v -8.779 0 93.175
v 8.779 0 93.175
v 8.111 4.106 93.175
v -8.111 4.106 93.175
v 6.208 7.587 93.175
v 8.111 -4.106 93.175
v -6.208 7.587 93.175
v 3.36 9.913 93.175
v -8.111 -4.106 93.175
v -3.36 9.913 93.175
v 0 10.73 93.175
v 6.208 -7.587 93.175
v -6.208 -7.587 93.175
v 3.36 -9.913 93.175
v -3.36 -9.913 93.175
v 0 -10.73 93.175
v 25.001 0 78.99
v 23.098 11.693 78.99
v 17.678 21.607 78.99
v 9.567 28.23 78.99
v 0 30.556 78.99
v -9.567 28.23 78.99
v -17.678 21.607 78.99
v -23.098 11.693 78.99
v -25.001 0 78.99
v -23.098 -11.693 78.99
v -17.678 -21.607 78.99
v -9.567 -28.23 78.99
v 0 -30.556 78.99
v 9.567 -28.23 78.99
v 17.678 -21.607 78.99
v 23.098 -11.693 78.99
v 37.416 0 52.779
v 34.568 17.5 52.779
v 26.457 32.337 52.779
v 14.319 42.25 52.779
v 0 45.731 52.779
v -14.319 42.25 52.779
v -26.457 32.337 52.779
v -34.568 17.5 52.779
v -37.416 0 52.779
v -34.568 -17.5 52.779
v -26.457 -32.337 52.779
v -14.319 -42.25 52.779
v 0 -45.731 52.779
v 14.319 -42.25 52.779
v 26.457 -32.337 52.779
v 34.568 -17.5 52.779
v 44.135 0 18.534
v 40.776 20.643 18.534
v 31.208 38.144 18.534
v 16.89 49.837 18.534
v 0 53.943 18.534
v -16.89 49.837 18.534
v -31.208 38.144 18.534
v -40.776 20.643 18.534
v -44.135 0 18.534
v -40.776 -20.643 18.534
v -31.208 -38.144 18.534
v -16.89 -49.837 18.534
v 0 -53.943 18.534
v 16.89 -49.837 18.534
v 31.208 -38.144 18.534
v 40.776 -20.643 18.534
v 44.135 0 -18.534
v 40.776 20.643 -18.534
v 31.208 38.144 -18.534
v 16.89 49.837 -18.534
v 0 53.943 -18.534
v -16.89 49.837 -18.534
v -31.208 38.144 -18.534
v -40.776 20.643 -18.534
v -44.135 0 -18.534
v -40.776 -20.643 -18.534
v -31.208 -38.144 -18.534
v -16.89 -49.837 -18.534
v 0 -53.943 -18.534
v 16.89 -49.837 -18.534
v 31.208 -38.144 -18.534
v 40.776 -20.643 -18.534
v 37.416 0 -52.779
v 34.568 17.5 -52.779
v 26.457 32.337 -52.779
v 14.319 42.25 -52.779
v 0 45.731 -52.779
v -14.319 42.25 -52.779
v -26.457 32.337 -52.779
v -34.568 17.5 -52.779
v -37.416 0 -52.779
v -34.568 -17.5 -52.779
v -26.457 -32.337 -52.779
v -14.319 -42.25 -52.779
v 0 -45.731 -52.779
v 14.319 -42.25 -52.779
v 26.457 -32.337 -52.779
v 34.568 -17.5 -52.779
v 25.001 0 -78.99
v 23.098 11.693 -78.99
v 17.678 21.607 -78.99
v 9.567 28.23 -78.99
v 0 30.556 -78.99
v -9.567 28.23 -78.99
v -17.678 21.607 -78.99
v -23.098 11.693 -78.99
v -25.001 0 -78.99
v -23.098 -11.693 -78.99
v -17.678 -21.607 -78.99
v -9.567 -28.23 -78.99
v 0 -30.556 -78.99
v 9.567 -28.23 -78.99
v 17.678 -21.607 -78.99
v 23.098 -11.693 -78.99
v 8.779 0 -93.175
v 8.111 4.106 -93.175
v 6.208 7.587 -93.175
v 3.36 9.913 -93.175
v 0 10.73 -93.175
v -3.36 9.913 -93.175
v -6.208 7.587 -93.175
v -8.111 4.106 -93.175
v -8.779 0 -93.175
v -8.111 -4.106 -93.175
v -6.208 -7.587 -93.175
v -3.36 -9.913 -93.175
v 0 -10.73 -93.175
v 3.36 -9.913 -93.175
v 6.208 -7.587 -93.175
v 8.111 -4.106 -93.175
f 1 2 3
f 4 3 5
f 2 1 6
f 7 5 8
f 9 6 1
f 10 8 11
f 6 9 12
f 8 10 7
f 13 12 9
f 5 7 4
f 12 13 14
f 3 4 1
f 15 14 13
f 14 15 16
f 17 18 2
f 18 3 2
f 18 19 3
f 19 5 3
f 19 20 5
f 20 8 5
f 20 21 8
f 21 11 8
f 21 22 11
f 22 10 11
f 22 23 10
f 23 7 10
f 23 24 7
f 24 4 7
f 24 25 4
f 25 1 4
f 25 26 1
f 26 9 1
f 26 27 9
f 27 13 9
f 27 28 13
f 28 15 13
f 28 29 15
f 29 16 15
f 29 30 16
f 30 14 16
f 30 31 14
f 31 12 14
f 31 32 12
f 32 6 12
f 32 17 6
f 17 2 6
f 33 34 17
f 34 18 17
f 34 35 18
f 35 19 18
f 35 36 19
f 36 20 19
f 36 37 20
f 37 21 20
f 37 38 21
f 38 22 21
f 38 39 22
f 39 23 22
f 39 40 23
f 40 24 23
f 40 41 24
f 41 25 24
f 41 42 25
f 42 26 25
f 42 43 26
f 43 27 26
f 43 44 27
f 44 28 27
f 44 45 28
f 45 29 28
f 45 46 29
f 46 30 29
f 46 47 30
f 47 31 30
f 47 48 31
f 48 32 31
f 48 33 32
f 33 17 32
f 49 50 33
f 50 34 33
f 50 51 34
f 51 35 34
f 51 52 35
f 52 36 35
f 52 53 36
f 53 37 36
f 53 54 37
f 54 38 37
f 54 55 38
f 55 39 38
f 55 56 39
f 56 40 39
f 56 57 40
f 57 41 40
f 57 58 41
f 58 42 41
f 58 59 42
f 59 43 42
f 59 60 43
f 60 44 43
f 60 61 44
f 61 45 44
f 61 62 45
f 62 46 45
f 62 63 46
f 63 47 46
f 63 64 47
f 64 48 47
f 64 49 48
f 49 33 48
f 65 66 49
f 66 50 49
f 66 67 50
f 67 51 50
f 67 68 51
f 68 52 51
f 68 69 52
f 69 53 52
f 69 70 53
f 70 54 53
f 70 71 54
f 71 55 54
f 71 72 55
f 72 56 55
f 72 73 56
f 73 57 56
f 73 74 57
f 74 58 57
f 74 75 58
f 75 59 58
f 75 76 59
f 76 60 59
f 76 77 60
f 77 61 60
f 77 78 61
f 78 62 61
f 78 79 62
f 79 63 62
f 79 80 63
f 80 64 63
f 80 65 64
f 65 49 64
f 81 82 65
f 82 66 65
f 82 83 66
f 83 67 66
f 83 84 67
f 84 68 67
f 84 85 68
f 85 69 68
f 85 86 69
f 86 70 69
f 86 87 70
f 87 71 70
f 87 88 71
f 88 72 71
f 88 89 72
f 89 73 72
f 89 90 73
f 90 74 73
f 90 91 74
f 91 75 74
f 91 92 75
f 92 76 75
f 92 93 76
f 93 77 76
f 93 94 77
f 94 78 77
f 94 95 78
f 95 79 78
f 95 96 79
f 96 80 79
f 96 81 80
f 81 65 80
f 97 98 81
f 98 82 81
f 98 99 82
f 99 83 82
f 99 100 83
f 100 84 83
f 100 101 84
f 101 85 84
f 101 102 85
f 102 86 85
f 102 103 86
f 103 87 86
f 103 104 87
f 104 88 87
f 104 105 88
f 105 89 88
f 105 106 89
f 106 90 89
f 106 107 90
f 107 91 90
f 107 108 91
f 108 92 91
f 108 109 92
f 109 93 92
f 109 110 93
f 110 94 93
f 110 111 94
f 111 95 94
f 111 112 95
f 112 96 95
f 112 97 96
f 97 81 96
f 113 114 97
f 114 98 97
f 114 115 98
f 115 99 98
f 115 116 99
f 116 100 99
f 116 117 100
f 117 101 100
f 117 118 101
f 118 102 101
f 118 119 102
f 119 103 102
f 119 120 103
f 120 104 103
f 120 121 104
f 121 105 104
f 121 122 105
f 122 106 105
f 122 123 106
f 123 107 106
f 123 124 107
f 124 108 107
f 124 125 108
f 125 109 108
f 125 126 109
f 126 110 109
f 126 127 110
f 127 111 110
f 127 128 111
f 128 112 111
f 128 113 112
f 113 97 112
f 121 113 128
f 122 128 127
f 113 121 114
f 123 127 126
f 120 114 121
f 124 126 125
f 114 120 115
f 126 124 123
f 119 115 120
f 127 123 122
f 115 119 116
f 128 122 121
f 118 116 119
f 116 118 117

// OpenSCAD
// Generated by SolidPython 1.0.1 on 2020-07-29 00:46:48


scale(v = [9, 11, 19]) {
	sphere(r = 5);
}
/***********************************************
*********      SolidPython code:      **********
************************************************
 
# import packages: SolidPython
from solid import *
from solid.utils import *
from itertools import chain, combinations, permutations


class Resize:

    def __init__(self, scad_file):
        self.scad_file = scad_file
        #self.scad_file = import_scad(scad_file)
        # cone/cylinder param:
        self.r1 = 0
        self.r2 = 0
        self.h = 0
        # rectangular prism param:
        self.w = 0
        self.l = 0
        # ellipse param:
        self.r = 0

    # import OpenScad code (file name corresponds to shape)


    # classify shape + parameters
    def assign(self, param1, param2, param3):
        if self.scad_file == 'cone.scad':
            self.r1 = param1
            self.r2 = param2
            self.h = param3
        elif self.scad_file == 'cylinder.scad':
            self.r1 = param1
            self.r2 = param2
            self.h = param3
        elif self.scad_file == 'rectangularPrism.scad':
            self.h = param1
            self.l = param2
            self.w = param3
        else:
            self.r = param1
            self.h = param2

    # resize parameters
    def iterate(self):
        x = range(3, 20, 2)
        i = 1
        if self.scad_file == 'cone.scad':
            tempList = list(permutations(x, 2))
            for temp in tempList:
                param1 = temp[0]
                param2 = temp[1]
                filepath = 'produced_scad_files/' + 'cone' + str(param1) + '_' + str(param2) + '_' + '.scad'
                scad_render_to_file(cylinder(h=param1, r1=param2, r2=0), filepath)

        elif self.scad_file == 'cylinder.scad':
            tempList = list(permutations(x, 3))
            for temp in tempList:
                param1 = temp[0]
                param2 = temp[1]
                filepath = 'produced_scad_files/' + 'cylinder' + str(param1) + '_' + str(param2) + '_' + '.scad'
                scad_render_to_file(cylinder(h=param1, r1=param2, r2=param2), filepath)

        elif self.scad_file == 'rectangularPrism.scad':
            tempList = list(permutations(x, 3))
            for temp in tempList:
                param1 = temp[0]
                param2 = temp[1]
                param3 = temp[2]
                filepath = 'produced_scad_files/' + 'rectangularPrism' + str(param1) + '_' + str(param2) + '_' + str(
                    param3) + '.scad'
                scad_render_to_file(cube(size=(param1, param2, param3)), filepath)

        elif self.scad_file == 'ellipse.scad':
            tempList = list(permutations(x, 4))
            for temp in tempList:
                param1 = temp[0]
                param2 = temp[1]
                param3 = temp[2]
                param4 = temp[3]
                filepath = 'produced_scad_files/' + 'ellipse' + str(param1) + '_' + str(param2) + '_' + str(param3) + '_' + str(param4) + '.scad'
                scad_render_to_file(scale([param1, param2, param3])(sphere(r=param4)), filepath)

    def render_to_scadfile(self):
        scad_render_to_file(scad, 'example.scad') 
 
************************************************/
